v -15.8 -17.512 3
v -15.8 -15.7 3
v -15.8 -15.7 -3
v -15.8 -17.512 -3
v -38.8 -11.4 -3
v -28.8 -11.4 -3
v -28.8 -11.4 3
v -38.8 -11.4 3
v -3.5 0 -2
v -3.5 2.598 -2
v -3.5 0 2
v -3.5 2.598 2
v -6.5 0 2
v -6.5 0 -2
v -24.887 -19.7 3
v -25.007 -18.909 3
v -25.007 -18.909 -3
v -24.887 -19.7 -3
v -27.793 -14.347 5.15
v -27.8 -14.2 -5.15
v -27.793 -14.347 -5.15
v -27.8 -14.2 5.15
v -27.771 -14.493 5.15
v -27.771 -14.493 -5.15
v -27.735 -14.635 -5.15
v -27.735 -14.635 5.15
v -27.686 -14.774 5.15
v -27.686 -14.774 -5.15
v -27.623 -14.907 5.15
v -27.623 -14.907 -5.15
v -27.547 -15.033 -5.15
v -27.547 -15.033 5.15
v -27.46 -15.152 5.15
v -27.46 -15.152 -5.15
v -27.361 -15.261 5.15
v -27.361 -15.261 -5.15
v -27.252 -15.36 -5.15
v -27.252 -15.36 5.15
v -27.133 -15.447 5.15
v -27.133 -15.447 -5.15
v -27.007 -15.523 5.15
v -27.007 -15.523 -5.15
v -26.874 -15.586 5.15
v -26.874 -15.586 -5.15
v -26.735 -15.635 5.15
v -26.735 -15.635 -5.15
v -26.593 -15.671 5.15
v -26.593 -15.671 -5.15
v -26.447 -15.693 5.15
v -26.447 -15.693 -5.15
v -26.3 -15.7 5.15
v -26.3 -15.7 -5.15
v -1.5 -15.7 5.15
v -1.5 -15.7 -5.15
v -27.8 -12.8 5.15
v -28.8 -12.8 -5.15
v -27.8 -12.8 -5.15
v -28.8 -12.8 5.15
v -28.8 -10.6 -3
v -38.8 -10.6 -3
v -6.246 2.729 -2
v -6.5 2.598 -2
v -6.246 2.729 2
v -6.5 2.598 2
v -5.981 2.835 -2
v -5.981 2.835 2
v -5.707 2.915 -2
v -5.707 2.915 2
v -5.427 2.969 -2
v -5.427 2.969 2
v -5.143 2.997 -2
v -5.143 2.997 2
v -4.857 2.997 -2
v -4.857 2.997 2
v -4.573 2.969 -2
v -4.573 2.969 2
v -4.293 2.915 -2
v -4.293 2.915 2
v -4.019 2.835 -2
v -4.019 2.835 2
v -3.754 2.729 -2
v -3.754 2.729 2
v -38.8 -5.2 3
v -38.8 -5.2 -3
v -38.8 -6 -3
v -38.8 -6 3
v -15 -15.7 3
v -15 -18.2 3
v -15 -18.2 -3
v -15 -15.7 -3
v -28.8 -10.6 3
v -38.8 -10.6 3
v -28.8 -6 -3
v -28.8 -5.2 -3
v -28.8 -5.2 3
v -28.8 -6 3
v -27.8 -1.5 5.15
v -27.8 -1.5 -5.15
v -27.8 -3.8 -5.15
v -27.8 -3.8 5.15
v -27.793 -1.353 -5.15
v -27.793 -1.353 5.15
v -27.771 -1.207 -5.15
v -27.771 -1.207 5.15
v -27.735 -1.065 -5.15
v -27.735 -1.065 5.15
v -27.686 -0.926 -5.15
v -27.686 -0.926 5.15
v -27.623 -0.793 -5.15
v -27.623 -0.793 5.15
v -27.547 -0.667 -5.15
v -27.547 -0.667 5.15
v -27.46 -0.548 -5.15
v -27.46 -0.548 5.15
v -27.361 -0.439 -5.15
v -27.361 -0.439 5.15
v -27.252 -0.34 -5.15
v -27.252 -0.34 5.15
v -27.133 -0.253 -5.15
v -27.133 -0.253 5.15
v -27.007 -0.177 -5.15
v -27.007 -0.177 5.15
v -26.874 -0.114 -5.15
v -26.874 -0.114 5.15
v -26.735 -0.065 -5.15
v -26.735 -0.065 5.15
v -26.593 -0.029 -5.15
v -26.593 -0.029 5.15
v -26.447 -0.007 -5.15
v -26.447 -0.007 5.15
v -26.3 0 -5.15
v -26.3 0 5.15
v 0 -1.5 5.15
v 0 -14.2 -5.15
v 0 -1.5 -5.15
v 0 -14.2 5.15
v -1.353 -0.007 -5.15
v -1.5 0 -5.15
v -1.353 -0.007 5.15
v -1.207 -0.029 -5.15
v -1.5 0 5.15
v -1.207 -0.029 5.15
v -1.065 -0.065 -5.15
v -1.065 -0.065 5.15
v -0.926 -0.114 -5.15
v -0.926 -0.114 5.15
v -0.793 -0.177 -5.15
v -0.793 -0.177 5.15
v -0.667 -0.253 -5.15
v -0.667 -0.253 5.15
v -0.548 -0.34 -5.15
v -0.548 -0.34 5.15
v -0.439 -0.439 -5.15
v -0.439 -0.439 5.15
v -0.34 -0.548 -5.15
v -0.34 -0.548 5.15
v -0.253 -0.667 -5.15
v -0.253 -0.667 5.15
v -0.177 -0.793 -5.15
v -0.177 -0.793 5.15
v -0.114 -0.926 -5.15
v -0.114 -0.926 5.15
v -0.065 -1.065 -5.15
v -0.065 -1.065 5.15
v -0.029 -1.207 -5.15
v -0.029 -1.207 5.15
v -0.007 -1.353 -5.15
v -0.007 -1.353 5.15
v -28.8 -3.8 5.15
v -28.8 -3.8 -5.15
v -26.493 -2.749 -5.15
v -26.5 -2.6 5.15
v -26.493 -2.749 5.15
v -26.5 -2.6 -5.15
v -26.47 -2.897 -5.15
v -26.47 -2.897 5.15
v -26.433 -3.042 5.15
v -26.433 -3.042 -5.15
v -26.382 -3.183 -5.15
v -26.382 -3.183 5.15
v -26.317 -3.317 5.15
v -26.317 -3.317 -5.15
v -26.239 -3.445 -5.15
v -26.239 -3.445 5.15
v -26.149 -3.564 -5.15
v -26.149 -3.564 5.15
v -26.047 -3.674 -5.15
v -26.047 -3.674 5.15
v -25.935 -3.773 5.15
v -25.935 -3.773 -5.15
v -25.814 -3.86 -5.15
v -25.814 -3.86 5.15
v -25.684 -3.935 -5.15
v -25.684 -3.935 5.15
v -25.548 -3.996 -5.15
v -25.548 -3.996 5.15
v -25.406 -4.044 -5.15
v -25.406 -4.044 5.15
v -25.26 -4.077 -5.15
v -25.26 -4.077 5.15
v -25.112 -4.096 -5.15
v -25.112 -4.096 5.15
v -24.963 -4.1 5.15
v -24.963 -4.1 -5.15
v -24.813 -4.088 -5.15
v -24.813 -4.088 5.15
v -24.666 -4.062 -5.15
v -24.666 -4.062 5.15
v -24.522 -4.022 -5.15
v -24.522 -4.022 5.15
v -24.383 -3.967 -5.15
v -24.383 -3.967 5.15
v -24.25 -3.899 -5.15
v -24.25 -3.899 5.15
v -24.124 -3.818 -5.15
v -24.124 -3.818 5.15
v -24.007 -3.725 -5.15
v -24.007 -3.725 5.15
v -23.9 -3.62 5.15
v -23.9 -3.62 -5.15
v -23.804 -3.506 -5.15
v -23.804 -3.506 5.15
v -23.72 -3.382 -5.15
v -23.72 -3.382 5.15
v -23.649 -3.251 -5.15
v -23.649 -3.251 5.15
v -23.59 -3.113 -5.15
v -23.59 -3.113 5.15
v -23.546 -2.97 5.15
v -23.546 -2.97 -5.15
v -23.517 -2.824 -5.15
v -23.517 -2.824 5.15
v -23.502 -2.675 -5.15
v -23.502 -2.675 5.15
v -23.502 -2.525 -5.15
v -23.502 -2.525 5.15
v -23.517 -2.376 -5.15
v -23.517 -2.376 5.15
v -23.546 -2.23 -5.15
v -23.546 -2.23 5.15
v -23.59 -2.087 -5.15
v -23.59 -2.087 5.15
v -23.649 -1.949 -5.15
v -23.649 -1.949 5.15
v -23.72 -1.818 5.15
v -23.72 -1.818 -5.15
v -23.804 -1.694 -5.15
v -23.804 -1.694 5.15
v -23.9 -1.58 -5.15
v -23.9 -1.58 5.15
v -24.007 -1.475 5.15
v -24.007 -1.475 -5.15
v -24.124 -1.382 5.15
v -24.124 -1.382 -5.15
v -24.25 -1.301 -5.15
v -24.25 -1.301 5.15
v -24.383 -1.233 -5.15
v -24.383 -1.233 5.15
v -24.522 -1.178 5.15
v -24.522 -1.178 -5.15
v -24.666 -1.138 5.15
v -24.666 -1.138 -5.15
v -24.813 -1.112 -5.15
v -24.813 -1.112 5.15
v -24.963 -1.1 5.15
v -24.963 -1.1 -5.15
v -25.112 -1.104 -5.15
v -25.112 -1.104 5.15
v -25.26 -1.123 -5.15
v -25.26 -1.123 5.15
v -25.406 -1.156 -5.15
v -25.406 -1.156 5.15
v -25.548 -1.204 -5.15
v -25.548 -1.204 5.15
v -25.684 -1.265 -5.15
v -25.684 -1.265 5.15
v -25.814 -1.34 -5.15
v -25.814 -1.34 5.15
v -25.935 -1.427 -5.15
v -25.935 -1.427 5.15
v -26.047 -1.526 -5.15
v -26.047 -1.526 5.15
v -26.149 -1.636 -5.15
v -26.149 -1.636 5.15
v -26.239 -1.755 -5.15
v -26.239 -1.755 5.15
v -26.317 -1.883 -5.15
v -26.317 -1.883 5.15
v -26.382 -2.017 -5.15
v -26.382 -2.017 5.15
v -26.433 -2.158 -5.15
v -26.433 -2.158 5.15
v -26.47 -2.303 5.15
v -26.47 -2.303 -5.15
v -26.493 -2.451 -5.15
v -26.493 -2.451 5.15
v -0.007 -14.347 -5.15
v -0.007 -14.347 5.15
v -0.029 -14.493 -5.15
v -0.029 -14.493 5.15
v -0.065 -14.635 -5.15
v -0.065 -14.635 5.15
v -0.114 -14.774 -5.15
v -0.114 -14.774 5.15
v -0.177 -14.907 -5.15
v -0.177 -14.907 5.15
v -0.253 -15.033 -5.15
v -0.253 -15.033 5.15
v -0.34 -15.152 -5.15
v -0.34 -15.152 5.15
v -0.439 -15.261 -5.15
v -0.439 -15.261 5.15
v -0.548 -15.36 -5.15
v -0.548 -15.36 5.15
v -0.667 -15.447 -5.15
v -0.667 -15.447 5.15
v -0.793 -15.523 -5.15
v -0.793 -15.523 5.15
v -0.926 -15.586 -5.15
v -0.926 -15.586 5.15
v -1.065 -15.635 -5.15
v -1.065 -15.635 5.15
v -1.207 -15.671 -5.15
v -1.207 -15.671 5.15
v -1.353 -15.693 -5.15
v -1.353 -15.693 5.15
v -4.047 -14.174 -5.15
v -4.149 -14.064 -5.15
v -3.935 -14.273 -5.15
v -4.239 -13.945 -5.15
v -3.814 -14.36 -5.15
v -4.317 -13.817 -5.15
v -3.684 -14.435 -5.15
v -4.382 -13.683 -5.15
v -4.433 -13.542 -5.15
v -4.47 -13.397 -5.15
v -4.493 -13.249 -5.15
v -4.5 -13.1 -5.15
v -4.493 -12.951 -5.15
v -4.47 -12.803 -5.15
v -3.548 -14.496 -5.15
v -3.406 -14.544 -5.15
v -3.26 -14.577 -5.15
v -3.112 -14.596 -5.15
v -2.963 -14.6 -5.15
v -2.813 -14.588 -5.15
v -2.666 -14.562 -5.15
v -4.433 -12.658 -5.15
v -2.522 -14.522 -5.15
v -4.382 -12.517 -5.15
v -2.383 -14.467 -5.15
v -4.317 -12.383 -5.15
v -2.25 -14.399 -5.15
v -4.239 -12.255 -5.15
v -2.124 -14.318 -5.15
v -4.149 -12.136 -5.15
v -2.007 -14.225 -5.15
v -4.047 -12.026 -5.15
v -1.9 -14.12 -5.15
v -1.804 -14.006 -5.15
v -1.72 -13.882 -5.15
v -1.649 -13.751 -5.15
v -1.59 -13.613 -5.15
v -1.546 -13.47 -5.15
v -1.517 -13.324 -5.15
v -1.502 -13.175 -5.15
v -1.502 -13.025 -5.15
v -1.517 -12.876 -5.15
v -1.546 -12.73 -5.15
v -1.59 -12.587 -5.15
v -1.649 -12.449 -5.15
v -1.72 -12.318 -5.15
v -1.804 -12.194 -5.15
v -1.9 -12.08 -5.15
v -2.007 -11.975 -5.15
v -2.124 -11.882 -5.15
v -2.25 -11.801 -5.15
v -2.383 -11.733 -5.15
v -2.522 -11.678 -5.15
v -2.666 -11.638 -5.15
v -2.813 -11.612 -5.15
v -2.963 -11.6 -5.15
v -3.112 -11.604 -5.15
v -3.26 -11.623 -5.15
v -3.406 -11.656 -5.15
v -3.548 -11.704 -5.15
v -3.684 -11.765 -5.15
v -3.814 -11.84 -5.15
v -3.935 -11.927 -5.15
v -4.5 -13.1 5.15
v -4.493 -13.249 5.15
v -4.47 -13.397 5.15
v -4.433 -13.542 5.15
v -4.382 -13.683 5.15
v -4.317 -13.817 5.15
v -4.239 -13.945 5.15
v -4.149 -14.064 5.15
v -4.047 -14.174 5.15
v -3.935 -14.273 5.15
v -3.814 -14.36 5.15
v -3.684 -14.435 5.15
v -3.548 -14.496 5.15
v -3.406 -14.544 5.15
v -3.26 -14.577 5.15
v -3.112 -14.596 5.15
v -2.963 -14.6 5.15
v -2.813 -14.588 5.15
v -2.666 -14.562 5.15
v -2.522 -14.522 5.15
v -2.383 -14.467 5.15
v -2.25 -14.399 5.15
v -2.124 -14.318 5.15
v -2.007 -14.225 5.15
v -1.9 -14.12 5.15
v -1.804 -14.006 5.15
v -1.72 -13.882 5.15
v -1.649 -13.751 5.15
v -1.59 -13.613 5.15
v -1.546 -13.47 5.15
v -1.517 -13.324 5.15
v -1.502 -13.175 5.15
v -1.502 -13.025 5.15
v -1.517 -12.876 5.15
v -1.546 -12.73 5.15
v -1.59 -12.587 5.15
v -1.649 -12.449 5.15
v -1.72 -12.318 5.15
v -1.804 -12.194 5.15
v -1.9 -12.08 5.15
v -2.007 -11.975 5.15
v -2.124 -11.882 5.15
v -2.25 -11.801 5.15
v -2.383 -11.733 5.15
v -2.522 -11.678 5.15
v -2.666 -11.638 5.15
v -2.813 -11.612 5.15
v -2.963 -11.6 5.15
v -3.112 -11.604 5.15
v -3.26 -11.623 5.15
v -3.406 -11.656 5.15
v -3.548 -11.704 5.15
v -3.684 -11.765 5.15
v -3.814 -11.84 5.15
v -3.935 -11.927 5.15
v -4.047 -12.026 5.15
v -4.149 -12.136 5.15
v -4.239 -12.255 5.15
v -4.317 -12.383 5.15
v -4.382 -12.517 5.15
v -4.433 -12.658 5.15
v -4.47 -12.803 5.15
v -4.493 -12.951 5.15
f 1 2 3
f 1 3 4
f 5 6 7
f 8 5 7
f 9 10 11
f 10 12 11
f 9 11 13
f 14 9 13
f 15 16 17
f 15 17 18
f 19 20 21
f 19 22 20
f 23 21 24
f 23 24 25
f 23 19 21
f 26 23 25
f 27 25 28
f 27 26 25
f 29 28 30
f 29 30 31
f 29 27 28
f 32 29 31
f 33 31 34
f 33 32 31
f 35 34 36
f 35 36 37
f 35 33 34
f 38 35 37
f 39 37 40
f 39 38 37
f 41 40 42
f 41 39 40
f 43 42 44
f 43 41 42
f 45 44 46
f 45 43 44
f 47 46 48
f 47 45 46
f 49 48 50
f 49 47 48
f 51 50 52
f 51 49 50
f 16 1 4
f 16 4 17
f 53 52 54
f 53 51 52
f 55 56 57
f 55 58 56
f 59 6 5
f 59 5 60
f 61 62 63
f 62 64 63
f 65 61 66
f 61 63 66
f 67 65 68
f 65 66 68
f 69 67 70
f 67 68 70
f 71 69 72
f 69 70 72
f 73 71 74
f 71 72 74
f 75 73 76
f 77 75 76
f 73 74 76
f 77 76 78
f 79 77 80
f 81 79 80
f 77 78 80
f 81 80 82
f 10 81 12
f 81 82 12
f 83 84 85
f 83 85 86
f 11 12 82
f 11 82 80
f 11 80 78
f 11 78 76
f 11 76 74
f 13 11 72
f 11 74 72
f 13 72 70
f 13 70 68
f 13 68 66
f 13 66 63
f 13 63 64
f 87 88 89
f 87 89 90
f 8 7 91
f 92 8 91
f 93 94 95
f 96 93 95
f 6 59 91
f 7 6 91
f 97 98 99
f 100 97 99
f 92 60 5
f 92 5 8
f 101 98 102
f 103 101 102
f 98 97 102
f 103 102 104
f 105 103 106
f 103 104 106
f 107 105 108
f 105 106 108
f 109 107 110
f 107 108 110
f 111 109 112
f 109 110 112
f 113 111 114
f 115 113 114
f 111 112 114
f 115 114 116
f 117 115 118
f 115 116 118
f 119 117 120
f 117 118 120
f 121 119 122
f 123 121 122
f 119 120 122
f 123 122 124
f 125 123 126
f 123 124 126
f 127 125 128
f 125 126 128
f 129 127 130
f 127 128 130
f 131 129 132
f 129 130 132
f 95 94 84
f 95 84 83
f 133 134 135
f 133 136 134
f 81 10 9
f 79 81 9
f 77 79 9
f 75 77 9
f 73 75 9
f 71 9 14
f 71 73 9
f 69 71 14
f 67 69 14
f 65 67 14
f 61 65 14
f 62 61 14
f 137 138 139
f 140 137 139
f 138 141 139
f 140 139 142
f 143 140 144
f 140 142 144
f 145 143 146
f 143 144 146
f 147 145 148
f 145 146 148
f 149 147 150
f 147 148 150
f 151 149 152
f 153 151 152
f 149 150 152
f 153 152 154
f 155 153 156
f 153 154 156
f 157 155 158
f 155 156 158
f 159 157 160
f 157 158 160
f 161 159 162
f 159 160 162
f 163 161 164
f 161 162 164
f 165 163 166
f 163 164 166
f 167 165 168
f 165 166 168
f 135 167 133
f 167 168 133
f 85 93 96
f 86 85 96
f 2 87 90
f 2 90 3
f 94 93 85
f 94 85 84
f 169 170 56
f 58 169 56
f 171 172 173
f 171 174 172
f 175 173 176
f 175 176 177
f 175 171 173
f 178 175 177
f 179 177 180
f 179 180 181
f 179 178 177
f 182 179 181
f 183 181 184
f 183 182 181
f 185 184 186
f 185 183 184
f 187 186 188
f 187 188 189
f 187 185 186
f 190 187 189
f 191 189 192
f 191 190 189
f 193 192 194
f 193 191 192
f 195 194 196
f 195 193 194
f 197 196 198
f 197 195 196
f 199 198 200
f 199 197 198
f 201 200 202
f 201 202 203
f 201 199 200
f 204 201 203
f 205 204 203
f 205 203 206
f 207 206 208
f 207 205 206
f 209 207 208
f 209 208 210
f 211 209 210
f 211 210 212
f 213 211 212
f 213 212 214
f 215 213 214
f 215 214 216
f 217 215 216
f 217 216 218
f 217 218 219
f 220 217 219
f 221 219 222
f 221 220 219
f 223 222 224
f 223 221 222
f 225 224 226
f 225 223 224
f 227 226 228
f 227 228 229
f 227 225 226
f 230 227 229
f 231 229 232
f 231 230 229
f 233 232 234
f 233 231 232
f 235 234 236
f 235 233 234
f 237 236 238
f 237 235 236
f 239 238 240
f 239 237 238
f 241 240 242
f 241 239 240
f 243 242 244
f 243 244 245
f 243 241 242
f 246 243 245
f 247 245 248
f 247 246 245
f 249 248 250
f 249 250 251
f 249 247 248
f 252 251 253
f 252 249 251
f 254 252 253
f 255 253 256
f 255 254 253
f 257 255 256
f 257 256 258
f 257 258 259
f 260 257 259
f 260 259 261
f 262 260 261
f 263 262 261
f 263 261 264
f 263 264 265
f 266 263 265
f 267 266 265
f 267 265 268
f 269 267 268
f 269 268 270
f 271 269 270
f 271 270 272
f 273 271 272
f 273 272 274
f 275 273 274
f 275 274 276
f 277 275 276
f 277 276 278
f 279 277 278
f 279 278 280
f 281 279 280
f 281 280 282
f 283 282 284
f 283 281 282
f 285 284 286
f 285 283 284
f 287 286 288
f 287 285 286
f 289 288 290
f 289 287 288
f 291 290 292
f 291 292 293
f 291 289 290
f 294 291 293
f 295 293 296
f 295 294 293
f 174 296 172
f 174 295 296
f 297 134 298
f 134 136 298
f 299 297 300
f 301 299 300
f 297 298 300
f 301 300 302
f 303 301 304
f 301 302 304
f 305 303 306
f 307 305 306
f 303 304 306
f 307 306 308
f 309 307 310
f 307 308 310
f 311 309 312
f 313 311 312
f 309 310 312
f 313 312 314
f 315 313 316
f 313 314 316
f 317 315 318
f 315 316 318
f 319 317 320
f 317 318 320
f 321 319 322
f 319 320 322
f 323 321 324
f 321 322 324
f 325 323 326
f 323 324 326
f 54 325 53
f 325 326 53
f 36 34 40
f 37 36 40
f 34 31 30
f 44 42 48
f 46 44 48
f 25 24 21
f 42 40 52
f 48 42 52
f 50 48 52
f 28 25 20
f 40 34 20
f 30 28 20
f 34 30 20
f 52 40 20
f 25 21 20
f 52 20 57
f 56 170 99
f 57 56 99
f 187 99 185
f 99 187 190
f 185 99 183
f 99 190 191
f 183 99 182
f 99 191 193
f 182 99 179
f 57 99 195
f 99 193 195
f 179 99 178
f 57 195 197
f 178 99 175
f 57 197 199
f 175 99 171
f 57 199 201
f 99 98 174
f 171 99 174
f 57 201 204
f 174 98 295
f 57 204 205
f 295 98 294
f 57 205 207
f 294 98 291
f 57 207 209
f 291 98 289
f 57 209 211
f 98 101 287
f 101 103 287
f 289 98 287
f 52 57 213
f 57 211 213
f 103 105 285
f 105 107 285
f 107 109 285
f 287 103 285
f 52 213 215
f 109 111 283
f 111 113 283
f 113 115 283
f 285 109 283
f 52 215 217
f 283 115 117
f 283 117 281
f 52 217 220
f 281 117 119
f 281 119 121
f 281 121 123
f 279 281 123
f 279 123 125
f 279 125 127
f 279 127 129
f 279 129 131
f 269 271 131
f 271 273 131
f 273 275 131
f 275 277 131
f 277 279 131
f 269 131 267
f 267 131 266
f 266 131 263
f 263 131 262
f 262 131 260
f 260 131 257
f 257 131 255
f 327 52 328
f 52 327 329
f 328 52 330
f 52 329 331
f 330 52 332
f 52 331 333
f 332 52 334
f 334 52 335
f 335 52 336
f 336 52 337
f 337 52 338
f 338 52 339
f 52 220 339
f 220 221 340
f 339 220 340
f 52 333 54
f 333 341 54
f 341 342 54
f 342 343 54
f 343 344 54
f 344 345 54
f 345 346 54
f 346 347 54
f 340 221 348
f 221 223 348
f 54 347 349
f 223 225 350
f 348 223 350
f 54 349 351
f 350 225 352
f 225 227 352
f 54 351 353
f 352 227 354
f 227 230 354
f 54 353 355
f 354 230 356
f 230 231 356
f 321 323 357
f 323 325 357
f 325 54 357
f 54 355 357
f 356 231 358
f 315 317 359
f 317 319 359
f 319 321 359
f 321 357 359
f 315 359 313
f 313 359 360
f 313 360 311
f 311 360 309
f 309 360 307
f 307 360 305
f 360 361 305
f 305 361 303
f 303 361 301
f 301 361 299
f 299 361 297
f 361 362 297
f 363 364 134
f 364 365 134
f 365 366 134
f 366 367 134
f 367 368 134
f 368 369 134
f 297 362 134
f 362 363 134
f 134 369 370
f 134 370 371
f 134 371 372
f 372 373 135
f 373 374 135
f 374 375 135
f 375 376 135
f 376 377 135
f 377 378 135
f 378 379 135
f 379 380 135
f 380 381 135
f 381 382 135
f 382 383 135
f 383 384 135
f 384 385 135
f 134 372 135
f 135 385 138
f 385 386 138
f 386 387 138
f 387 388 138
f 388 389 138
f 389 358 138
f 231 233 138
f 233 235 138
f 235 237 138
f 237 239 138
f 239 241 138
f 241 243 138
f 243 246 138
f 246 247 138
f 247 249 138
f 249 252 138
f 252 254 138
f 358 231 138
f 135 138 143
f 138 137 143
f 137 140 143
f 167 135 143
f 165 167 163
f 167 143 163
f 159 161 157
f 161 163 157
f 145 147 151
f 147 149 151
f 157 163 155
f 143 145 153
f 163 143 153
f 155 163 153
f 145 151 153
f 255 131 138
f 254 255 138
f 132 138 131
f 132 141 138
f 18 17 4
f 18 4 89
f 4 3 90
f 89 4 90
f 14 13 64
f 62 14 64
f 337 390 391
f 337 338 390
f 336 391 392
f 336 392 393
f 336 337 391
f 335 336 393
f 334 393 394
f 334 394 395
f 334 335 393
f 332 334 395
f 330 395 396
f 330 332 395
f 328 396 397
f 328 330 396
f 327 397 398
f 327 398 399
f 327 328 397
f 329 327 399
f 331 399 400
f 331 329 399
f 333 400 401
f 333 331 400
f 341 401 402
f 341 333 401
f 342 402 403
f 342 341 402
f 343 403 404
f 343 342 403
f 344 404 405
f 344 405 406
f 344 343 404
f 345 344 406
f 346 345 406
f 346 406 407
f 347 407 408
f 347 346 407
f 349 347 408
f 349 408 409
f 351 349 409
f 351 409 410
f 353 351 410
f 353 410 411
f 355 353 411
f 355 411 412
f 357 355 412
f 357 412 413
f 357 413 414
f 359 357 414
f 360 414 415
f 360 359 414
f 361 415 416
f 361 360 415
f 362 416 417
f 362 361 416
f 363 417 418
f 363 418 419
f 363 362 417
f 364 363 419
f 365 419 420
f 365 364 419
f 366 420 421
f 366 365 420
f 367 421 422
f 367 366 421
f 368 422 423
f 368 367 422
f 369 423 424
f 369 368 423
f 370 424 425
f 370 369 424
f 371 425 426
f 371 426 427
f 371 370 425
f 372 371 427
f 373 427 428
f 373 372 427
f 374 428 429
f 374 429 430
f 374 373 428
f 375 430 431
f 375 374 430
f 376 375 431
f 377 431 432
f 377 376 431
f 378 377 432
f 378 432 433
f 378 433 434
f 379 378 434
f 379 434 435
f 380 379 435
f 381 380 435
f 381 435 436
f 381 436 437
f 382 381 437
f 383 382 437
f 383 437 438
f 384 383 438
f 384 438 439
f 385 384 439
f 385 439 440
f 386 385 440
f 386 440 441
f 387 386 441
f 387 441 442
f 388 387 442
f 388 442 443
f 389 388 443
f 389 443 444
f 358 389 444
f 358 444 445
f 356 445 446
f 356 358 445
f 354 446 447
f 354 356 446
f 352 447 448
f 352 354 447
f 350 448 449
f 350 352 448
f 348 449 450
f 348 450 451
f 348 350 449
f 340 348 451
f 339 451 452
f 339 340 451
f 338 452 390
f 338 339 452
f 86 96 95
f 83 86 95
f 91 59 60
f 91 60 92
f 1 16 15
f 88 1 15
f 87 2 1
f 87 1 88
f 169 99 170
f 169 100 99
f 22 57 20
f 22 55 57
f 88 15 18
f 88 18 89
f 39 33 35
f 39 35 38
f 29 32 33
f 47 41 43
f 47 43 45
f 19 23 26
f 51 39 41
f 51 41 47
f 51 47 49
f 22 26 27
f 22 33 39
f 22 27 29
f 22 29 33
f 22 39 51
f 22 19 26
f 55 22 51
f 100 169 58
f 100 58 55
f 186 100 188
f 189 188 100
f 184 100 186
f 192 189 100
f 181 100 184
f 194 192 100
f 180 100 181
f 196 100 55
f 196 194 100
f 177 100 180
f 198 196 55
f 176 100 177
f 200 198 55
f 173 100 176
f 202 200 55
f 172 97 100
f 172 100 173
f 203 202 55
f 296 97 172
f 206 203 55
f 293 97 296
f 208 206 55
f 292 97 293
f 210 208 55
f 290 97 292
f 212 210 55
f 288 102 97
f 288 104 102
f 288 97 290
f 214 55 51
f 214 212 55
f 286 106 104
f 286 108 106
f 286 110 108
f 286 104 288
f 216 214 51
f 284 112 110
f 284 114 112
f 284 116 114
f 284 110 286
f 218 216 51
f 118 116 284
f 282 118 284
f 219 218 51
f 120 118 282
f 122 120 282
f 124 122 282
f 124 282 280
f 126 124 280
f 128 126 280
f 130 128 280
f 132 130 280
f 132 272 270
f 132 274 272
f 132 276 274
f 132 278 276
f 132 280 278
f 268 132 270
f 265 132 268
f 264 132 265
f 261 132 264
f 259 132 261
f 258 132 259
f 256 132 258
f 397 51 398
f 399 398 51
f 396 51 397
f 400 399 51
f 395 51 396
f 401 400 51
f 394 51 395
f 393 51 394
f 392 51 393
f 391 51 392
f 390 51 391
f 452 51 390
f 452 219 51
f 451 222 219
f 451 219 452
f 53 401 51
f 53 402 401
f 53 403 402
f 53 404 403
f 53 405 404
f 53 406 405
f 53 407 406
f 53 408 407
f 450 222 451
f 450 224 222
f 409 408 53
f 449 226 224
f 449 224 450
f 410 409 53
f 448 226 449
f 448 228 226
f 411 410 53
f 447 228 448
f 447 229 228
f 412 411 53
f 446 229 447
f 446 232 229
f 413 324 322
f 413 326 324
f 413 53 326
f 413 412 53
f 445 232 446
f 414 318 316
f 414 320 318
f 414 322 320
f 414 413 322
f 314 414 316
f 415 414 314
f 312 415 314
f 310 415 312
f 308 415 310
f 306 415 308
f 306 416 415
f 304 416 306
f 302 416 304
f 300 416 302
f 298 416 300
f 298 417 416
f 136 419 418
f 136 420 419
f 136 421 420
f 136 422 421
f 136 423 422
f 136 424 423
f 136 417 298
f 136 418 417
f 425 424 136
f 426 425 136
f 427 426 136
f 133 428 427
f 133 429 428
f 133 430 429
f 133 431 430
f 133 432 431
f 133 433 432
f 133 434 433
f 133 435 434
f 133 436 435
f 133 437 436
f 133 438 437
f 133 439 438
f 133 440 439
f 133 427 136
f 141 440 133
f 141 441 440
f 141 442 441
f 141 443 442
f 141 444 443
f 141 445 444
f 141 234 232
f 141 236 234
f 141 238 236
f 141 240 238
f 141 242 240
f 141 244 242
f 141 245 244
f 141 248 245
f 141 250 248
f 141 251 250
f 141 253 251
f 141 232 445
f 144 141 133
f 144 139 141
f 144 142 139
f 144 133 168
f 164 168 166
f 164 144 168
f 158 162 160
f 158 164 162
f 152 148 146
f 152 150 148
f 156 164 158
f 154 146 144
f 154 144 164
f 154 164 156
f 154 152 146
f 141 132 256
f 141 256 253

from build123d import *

# Parameters (mm, degrees)
ESQUISSE1_R          = 1.5
BOSS_EXTRU_1_DEPTH   = 5.15
ESQUISSE2_W          = 6
ESQUISSE2_H          = 0.8
BOSS_EXTRU_2_DEPTH   = 10
BOSS_EXTRU_2_2_DEPTH = 10
BOSS_EXTRU_3_DEPTH   = 6
BOSS_EXTRU_4_DEPTH   = 2
CONG_1_R             = 1.5


with BuildPart() as part:
    # Esquisse1 → Boss.-Extru.1 (new, symmetric)
    with BuildSketch(Plane.XY):
        Polygon((-27.8, -12.8), (-27.8, -15.7), (0, -15.7), (0, 0), (-27.8, 0), (-27.8, -3.8), (-28.8, -3.8), (-28.8, -12.8), align=None)
        with Locations(Location((-25, -2.6, 0), (0, 0, 180))):
            Circle(ESQUISSE1_R, mode=Mode.SUBTRACT)
        with Locations(Location((-3, -13.1, 0), (0, 0, 180))):
            Circle(ESQUISSE1_R, mode=Mode.SUBTRACT)
    extrude(amount=BOSS_EXTRU_1_DEPTH, both=True)

    # Congé1
    cong_1_edges = [part.edges().sort_by_distance(p)[0] for p in [
        (0, -15.7, 0),
        (-27.8, -15.7, 0),
        (-27.8, 0, 0),
        (0, 0, 0),
    ]]
    fillet(cong_1_edges, radius=CONG_1_R)


with BuildPart() as body_2:
    # Esquisse2 → Boss.-Extru.2 (new body)
    with BuildSketch(Plane.ZY.offset(28.8)):
        with Locations((0, -5.6)):
            Rectangle(ESQUISSE2_W, ESQUISSE2_H)
    extrude(amount=BOSS_EXTRU_2_DEPTH)


with BuildPart() as body_3:
    # Esquisse2 → Boss.-Extru.2 2 (new body)
    with BuildSketch(Plane.ZY.offset(28.8)):
        with Locations((0, -11)):
            Rectangle(ESQUISSE2_W, ESQUISSE2_H)
    extrude(amount=BOSS_EXTRU_2_2_DEPTH)


with BuildPart() as body_4:
    # Esquisse3 → Boss.-Extru.3 (new body)
    with BuildSketch(Plane.XY.offset(3)):
        Polygon((-25.006859967, -18.909051203), (-24.886859967, -19.7), (-15, -18.2), (-15, -15.7), (-15.8, -15.7), (-15.8, -17.512218437), align=None)
    extrude(amount=-BOSS_EXTRU_3_DEPTH)


with BuildPart() as body_5:
    # Esquisse4 → Boss.-Extru.4 (new, symmetric)
    with BuildSketch(Plane.XY):
        with BuildLine():
            Line((-6.5, 0), (-6.5, 2.598076211))
            ThreePointArc((-6.5, 2.598076211), (-5, 3), (-3.5, 2.598076211))
            Line((-3.5, 2.598076211), (-3.5, 0))
            Line((-3.5, 0), (-6.5, 0))
        make_face()
    extrude(amount=BOSS_EXTRU_4_DEPTH, both=True)


solid = Compound([part.part, body_2.part, body_3.part, body_4.part, body_5.part])
